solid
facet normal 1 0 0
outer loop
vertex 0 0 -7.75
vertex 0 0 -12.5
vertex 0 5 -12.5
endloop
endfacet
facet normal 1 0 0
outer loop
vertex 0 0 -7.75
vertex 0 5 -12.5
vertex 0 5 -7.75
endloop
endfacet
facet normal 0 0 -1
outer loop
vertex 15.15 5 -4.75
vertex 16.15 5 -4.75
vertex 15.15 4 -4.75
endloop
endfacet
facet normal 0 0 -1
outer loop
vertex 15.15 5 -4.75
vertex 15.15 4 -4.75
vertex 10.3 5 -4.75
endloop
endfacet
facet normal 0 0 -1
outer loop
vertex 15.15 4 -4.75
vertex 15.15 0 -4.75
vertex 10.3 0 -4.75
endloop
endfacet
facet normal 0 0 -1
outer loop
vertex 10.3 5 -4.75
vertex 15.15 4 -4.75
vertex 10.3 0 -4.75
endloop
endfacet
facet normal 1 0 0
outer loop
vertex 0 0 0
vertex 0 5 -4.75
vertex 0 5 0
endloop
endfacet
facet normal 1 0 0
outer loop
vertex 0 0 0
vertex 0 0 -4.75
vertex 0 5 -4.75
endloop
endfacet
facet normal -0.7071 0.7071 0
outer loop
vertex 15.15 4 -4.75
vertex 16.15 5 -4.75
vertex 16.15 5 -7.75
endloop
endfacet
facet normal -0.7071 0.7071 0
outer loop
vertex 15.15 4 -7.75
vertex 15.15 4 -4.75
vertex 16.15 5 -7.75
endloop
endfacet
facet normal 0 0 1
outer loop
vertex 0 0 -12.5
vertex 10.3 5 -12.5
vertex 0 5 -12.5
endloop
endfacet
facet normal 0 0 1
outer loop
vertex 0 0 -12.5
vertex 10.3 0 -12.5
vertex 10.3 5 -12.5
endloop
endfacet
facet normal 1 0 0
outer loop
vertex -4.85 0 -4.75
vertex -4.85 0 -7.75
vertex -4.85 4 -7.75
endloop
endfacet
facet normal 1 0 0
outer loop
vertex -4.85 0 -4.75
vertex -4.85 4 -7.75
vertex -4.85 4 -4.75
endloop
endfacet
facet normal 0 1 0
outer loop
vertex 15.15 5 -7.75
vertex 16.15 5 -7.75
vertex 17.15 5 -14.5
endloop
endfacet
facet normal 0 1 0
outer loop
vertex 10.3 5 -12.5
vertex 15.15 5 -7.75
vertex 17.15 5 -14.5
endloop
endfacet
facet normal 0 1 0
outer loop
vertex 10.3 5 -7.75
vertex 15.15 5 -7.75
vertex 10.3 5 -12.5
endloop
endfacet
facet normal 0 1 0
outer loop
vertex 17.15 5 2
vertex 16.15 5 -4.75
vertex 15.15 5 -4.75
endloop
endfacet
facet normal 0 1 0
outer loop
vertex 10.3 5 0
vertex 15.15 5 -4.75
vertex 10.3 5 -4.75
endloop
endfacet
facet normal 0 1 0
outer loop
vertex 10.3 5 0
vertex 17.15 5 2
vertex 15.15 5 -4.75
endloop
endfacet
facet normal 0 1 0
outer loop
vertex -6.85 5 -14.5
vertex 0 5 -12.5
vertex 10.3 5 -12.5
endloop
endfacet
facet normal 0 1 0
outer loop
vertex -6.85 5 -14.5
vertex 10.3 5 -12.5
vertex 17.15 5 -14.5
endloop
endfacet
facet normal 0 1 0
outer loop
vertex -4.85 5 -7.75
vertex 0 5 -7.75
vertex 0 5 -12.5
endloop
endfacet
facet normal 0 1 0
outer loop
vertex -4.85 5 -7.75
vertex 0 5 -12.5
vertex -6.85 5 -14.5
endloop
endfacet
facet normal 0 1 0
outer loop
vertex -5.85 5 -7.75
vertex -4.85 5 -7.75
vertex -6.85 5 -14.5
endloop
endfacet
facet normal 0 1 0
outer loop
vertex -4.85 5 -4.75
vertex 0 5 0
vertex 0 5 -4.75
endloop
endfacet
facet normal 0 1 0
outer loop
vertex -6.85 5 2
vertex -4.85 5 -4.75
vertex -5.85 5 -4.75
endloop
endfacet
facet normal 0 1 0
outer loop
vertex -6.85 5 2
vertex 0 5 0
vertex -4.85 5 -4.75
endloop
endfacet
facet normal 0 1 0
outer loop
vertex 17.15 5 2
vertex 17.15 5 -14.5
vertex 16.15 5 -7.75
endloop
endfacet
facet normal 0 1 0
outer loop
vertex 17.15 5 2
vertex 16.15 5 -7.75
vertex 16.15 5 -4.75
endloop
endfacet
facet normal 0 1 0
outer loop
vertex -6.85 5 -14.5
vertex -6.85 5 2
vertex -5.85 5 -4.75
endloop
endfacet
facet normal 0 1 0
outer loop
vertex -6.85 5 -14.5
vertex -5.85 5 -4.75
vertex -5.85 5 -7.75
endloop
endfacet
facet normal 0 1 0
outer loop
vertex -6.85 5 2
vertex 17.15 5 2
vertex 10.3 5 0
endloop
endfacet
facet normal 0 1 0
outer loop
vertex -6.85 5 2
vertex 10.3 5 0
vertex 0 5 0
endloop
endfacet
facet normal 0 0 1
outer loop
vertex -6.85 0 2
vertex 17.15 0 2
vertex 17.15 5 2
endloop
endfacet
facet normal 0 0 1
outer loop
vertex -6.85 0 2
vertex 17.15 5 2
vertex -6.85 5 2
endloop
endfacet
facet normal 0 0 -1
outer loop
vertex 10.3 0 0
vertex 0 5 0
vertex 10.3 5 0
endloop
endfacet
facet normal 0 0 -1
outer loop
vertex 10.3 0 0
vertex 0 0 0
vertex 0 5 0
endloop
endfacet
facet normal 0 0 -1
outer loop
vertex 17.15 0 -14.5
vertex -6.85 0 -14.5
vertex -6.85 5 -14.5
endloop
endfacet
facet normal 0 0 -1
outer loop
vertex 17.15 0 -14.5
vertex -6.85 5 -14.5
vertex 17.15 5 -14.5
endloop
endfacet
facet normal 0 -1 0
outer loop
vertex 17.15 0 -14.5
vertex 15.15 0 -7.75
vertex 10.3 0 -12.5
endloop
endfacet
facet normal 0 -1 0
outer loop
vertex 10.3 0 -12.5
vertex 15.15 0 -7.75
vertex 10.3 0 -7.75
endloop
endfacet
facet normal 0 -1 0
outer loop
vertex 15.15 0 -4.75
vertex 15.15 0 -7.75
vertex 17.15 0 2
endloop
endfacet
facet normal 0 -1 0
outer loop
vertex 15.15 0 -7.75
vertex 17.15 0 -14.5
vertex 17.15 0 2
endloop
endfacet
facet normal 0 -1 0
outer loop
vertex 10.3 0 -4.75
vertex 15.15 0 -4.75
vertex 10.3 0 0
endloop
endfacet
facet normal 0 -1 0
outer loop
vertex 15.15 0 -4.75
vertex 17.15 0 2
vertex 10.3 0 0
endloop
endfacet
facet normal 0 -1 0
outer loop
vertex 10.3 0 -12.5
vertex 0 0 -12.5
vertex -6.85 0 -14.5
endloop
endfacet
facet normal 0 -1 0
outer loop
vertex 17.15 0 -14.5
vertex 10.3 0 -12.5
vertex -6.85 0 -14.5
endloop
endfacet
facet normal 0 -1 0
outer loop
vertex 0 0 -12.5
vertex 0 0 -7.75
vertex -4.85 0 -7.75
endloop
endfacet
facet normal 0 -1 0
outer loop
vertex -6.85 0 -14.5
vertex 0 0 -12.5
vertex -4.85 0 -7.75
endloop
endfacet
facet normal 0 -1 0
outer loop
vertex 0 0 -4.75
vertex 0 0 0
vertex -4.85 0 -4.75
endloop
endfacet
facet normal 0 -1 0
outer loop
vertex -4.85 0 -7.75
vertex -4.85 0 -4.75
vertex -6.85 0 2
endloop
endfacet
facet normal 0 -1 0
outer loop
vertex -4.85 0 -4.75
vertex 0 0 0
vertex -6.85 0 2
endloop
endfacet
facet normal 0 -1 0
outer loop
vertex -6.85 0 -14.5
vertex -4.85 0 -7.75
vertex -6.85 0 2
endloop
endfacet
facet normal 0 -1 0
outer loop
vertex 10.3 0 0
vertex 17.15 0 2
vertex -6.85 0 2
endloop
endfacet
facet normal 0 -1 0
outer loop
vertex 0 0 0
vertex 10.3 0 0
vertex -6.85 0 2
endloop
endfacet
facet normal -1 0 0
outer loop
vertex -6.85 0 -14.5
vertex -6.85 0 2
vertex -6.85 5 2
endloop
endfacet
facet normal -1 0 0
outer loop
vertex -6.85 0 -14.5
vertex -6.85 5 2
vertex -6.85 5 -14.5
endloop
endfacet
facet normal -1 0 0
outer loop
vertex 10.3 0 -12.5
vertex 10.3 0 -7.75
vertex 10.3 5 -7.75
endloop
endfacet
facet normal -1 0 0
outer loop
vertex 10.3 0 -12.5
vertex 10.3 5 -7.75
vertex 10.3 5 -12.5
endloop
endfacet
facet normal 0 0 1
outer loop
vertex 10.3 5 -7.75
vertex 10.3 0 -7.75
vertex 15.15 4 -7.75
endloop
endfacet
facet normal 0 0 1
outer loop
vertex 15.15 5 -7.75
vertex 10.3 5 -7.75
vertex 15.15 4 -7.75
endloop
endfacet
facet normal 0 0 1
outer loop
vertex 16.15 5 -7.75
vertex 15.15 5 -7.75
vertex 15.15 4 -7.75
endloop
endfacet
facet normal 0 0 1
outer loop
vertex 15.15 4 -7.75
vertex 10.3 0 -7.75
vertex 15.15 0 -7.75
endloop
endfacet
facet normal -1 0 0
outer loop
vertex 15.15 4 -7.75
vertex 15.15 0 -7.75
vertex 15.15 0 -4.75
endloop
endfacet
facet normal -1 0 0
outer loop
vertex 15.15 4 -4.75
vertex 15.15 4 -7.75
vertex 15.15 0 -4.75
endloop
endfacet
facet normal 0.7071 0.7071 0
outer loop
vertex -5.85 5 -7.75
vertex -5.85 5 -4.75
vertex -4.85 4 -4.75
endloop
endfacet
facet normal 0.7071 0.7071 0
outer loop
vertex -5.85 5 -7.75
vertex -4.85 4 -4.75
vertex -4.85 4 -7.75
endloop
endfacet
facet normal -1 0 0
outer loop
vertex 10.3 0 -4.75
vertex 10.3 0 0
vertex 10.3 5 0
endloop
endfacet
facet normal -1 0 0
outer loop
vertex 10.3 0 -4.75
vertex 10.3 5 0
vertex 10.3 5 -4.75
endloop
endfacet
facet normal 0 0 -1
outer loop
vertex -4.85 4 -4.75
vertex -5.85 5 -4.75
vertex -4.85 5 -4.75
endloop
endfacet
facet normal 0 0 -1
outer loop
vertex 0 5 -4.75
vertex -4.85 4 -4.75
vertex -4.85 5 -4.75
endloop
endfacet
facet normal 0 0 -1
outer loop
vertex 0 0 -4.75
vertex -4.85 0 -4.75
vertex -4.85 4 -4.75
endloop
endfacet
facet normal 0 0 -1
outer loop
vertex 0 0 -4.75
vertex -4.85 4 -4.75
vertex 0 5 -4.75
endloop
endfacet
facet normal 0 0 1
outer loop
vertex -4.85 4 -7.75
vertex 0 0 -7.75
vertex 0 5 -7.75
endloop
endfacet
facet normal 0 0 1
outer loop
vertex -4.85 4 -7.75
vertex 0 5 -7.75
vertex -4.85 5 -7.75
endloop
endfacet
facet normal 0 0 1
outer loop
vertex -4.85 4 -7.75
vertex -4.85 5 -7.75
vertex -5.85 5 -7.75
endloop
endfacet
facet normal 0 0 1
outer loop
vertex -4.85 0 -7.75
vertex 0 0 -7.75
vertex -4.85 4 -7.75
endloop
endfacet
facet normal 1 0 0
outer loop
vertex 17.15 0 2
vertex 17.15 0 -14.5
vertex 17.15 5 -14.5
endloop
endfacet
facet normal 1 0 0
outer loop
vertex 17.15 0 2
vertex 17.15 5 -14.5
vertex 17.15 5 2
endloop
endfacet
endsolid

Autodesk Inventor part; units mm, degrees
ref_plane "YZ Plane" through (0, 0, 0) normal (1, 0, 0) x (0, 1, 0)
ref_plane "XZ Plane" through (0, 0, 0) normal (0, 1, 0) x (-1, 0, 0)
ref_plane "XY Plane" through (0, 0, 0) normal (0, 0, 1) x (1, 0, 0)
sketch "Sketch1" plane through (0, 0, 0) normal (0, 1, 0) x (-1, 0, 0)
  line L0 (0, 0) -> (-10.3, 0)
  line L1 (-10.3, 0) -> (-10.3, -12.5)
  line L2 (-10.3, -12.5) -> (0, -12.5)
  line L3 (0, -12.5) -> (0, 0)
  line L4 (6.85, -14.5) -> (-17.15, -14.5)
  line L5 (-17.15, -14.5) -> (-17.15, 2)
  line L6 (-17.15, 2) -> (6.85, 2)
  line L7 (6.85, 2) -> (6.85, -14.5)
  line L8 (0, -7.75) -> (4.85, -7.75)
  line L9 (4.85, -7.75) -> (4.85, -4.75)
  line L10 (4.85, -4.75) -> (0, -4.75)
  line L11 (-10.3, -7.75) -> (-15.15, -7.75)
  line L12 (-15.15, -7.75) -> (-15.15, -4.75)
  line L13 (-15.15, -4.75) -> (-10.3, -4.75)
  point P0 (-15.15, -6.25)
  point P1 (-10.3, -6.25)
  dimension "d0" = 3
  dimension "d1" = 10.3
  dimension "d2" = 12.5
  dimension "d3" = 2
  dimension "d4" = 2
  dimension "d5" = 2
  dimension "d6" = 2
  dimension "d7" = 20
extrude "Extrusion1" add sketch "Sketch1" along normal blind 5
chamfer "Chamfer1" distance 1 angle 45 2 edges at (-4.85, 5, -6.25) (15.15, 5, -6.25)
properties part number "Slot Detector Holder" material "ABS Plastic"
